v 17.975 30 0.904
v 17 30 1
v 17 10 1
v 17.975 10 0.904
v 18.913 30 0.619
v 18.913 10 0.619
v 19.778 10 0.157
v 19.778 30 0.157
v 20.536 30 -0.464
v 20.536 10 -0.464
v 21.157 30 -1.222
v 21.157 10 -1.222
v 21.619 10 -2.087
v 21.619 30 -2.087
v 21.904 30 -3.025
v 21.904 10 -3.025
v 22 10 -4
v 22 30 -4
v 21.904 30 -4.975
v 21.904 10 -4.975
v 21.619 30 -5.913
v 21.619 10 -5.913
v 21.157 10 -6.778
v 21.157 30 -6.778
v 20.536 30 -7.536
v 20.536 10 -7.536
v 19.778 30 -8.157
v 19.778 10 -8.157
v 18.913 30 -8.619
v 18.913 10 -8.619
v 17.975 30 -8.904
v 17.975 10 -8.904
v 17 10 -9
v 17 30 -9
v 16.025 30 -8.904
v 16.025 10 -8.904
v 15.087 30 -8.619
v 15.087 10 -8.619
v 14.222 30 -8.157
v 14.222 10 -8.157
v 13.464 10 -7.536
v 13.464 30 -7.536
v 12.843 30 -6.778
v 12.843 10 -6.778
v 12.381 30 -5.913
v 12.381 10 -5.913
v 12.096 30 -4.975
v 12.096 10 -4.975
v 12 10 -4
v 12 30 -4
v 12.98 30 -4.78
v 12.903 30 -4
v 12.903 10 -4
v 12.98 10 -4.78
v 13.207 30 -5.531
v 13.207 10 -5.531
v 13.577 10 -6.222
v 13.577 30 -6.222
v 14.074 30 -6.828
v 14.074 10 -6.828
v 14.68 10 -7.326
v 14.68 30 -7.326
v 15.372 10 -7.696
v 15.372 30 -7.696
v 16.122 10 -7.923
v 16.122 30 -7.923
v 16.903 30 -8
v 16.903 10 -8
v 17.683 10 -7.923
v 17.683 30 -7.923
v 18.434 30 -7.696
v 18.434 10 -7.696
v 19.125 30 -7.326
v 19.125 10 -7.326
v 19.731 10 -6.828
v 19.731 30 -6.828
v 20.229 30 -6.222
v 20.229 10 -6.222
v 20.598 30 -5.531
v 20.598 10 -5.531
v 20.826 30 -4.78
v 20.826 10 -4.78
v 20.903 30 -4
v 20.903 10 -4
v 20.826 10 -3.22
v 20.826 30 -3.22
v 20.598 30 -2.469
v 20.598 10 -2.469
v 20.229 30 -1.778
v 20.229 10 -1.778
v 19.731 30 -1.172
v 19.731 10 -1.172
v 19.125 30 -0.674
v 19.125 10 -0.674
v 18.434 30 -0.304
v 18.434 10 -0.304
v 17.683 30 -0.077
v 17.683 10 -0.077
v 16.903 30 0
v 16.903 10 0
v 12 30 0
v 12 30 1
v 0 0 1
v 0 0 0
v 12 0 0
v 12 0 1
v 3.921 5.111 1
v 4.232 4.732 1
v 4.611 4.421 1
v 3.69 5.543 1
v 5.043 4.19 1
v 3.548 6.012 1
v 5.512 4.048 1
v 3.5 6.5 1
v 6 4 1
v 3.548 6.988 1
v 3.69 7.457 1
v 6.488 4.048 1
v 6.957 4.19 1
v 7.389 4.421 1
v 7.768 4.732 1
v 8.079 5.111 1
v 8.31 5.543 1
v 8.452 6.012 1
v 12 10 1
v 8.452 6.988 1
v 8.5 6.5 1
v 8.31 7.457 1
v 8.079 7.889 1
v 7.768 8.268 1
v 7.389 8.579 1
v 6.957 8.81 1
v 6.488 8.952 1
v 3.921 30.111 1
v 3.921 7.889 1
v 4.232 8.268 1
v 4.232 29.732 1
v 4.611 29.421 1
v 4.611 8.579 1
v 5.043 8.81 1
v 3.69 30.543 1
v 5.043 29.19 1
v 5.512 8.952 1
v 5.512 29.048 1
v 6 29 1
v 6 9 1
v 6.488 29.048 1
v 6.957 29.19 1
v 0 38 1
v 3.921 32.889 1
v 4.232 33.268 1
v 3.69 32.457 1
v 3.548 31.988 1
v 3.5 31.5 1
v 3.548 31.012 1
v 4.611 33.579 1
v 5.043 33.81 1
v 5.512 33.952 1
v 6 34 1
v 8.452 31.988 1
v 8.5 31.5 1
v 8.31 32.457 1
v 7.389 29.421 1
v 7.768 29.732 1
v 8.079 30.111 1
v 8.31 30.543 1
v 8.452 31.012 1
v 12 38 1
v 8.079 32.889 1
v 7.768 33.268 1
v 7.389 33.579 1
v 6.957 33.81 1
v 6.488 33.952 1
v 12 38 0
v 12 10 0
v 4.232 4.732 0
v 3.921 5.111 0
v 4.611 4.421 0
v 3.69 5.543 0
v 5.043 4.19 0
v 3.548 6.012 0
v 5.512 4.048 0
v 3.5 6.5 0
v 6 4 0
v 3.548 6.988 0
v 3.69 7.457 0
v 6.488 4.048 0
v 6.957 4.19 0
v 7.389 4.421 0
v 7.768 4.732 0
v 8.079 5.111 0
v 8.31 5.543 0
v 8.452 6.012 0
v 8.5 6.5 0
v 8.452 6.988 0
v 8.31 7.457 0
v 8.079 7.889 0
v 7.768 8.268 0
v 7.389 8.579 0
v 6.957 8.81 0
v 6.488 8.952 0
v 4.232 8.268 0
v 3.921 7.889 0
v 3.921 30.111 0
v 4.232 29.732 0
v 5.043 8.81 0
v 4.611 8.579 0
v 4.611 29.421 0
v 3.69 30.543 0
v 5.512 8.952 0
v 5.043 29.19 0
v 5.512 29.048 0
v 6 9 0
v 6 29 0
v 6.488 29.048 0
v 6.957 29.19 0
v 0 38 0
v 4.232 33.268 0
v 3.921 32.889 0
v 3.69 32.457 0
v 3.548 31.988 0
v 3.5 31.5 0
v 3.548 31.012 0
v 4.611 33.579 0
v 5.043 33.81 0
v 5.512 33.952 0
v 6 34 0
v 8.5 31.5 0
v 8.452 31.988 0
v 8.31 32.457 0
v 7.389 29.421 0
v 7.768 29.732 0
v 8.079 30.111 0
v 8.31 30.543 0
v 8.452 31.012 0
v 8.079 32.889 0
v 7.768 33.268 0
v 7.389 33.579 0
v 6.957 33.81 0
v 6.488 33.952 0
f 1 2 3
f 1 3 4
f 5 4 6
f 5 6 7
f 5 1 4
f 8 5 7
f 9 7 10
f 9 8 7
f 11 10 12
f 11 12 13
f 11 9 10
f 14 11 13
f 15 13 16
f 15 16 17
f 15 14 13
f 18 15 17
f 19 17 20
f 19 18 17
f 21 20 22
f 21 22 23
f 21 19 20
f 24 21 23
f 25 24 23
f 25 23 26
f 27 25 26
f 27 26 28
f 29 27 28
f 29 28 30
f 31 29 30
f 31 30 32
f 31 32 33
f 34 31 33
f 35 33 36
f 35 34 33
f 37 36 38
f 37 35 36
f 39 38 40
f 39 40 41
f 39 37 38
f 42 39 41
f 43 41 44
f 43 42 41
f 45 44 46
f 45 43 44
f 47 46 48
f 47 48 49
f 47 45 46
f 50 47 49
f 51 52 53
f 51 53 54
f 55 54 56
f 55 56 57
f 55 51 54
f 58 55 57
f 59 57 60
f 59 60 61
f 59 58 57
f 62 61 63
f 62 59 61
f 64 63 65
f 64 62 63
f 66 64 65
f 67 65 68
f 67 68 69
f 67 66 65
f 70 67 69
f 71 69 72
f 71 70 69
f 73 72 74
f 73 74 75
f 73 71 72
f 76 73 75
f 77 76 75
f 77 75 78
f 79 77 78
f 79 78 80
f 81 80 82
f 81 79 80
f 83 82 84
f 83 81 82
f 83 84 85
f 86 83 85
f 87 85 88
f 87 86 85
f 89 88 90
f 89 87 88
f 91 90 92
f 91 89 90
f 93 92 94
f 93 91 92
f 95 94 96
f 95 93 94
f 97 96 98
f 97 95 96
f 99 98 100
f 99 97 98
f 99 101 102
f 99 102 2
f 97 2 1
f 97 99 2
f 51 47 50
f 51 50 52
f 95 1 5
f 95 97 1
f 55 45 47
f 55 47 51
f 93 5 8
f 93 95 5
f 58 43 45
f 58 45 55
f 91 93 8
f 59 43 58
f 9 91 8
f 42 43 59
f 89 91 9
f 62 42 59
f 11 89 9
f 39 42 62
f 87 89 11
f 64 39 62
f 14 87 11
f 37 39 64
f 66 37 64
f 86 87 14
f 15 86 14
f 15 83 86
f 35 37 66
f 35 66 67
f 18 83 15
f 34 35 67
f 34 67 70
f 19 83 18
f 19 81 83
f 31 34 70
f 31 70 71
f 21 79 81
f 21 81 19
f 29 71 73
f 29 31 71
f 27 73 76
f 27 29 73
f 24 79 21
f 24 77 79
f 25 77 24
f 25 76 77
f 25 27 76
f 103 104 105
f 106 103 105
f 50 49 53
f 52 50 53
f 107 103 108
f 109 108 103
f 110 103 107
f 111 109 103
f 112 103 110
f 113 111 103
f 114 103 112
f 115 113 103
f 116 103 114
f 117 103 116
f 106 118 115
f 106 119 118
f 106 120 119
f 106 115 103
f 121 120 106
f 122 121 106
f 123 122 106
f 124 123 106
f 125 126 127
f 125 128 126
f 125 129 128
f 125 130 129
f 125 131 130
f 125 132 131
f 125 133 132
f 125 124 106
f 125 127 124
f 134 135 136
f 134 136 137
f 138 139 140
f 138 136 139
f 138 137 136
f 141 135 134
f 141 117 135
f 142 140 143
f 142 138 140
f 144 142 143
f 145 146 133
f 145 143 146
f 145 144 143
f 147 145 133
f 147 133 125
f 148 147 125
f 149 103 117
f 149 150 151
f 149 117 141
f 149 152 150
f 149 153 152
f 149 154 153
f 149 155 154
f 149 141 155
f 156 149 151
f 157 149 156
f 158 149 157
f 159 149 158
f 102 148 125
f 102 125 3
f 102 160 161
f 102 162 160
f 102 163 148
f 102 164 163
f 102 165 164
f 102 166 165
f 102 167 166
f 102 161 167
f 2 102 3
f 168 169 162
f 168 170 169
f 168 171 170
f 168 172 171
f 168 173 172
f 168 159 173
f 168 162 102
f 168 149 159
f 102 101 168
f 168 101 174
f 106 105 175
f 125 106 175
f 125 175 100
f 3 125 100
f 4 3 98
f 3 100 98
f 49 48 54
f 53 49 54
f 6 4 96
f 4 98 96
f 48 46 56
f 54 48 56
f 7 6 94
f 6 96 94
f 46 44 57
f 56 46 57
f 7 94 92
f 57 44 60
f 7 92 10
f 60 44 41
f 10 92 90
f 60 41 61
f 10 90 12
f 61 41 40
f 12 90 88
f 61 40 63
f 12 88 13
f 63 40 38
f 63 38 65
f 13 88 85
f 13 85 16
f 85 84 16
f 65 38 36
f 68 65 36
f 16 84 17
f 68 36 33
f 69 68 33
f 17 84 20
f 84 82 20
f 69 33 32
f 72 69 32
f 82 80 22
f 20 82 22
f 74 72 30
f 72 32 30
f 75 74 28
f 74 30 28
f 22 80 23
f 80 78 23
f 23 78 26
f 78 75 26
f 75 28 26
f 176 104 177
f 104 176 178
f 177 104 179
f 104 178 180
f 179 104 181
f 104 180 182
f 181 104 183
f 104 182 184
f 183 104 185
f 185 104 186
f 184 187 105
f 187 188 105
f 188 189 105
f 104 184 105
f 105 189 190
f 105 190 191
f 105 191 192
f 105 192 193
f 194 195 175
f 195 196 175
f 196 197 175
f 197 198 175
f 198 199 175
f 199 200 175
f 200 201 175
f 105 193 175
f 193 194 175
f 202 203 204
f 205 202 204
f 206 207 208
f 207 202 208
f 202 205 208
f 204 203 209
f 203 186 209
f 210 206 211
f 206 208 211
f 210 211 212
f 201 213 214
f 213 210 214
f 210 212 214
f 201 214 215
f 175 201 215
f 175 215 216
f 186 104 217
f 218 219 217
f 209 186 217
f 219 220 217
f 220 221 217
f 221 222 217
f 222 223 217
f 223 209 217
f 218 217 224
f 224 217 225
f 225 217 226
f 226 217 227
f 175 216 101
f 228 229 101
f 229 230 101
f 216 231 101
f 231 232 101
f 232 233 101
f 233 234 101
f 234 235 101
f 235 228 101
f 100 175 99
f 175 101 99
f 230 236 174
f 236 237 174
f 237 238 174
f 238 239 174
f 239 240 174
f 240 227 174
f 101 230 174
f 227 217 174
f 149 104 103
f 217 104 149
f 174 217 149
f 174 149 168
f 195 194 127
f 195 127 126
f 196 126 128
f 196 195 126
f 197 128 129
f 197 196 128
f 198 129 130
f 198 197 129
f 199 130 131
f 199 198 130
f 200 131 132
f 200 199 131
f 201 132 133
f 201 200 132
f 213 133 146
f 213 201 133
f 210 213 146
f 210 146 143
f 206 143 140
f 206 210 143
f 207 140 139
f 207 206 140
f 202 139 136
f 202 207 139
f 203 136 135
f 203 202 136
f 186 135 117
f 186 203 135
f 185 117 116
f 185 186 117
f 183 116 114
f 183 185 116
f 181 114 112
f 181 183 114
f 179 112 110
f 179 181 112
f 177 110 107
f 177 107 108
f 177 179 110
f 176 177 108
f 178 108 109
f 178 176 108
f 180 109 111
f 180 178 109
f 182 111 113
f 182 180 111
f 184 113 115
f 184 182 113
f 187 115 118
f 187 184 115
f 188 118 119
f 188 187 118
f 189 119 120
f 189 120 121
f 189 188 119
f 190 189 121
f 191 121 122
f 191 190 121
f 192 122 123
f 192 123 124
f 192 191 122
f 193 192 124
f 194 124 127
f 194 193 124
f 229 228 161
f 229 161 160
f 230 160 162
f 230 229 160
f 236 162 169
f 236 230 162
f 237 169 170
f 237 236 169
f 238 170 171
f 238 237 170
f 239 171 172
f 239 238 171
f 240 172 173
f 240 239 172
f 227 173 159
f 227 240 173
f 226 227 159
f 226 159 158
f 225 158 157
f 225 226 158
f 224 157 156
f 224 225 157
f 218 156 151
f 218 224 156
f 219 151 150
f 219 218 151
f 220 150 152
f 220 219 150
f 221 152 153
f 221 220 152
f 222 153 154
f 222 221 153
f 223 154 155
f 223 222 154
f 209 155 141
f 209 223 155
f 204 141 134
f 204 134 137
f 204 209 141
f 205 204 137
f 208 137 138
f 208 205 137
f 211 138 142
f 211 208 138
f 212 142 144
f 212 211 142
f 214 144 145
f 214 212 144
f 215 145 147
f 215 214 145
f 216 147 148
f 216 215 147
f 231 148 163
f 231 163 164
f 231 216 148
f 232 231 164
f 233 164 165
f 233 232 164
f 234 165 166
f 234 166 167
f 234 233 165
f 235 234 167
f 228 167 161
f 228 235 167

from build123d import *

# Parameters (mm, degrees)
SKETCH_1_W      = 12
SKETCH_1_H      = 38
SKETCH_1_R      = 2.5
EXTRUDE_1_DEPTH = 1
EXTRUDE_2_DEPTH = 20


with BuildPart() as part:
    # 草图1 → 凸台-拉伸1 (new body)
    with BuildSketch(Plane.XY):
        with Locations((6, 19)):
            Rectangle(SKETCH_1_W, SKETCH_1_H)
        with Locations((6, 31.5)):
            Circle(SKETCH_1_R, mode=Mode.SUBTRACT)
        with Locations((6, 6.5)):
            Circle(SKETCH_1_R, mode=Mode.SUBTRACT)
    extrude(amount=EXTRUDE_1_DEPTH)

    # 草图2 → 凸台-拉伸2 (add)
    with BuildSketch(Plane(origin=(0, 30, 0), x_dir=(1, 0, 0), z_dir=(0, 1, 0))):
        with BuildLine():
            Line((12, 0), (12, -1))
            Line((12, -1), (17, -1))
            ThreePointArc((17, -1), (20.535533906, 7.535533906), (12, 4))
            Line((12, 4), (12.902768587, 4))
            ThreePointArc((12.902768587, 4), (19.731195711, 6.828427125), (16.902768587, 0))
            Line((16.902768587, 0), (12, 0))
        make_face()
    extrude(amount=-EXTRUDE_2_DEPTH)


solid = part.part
